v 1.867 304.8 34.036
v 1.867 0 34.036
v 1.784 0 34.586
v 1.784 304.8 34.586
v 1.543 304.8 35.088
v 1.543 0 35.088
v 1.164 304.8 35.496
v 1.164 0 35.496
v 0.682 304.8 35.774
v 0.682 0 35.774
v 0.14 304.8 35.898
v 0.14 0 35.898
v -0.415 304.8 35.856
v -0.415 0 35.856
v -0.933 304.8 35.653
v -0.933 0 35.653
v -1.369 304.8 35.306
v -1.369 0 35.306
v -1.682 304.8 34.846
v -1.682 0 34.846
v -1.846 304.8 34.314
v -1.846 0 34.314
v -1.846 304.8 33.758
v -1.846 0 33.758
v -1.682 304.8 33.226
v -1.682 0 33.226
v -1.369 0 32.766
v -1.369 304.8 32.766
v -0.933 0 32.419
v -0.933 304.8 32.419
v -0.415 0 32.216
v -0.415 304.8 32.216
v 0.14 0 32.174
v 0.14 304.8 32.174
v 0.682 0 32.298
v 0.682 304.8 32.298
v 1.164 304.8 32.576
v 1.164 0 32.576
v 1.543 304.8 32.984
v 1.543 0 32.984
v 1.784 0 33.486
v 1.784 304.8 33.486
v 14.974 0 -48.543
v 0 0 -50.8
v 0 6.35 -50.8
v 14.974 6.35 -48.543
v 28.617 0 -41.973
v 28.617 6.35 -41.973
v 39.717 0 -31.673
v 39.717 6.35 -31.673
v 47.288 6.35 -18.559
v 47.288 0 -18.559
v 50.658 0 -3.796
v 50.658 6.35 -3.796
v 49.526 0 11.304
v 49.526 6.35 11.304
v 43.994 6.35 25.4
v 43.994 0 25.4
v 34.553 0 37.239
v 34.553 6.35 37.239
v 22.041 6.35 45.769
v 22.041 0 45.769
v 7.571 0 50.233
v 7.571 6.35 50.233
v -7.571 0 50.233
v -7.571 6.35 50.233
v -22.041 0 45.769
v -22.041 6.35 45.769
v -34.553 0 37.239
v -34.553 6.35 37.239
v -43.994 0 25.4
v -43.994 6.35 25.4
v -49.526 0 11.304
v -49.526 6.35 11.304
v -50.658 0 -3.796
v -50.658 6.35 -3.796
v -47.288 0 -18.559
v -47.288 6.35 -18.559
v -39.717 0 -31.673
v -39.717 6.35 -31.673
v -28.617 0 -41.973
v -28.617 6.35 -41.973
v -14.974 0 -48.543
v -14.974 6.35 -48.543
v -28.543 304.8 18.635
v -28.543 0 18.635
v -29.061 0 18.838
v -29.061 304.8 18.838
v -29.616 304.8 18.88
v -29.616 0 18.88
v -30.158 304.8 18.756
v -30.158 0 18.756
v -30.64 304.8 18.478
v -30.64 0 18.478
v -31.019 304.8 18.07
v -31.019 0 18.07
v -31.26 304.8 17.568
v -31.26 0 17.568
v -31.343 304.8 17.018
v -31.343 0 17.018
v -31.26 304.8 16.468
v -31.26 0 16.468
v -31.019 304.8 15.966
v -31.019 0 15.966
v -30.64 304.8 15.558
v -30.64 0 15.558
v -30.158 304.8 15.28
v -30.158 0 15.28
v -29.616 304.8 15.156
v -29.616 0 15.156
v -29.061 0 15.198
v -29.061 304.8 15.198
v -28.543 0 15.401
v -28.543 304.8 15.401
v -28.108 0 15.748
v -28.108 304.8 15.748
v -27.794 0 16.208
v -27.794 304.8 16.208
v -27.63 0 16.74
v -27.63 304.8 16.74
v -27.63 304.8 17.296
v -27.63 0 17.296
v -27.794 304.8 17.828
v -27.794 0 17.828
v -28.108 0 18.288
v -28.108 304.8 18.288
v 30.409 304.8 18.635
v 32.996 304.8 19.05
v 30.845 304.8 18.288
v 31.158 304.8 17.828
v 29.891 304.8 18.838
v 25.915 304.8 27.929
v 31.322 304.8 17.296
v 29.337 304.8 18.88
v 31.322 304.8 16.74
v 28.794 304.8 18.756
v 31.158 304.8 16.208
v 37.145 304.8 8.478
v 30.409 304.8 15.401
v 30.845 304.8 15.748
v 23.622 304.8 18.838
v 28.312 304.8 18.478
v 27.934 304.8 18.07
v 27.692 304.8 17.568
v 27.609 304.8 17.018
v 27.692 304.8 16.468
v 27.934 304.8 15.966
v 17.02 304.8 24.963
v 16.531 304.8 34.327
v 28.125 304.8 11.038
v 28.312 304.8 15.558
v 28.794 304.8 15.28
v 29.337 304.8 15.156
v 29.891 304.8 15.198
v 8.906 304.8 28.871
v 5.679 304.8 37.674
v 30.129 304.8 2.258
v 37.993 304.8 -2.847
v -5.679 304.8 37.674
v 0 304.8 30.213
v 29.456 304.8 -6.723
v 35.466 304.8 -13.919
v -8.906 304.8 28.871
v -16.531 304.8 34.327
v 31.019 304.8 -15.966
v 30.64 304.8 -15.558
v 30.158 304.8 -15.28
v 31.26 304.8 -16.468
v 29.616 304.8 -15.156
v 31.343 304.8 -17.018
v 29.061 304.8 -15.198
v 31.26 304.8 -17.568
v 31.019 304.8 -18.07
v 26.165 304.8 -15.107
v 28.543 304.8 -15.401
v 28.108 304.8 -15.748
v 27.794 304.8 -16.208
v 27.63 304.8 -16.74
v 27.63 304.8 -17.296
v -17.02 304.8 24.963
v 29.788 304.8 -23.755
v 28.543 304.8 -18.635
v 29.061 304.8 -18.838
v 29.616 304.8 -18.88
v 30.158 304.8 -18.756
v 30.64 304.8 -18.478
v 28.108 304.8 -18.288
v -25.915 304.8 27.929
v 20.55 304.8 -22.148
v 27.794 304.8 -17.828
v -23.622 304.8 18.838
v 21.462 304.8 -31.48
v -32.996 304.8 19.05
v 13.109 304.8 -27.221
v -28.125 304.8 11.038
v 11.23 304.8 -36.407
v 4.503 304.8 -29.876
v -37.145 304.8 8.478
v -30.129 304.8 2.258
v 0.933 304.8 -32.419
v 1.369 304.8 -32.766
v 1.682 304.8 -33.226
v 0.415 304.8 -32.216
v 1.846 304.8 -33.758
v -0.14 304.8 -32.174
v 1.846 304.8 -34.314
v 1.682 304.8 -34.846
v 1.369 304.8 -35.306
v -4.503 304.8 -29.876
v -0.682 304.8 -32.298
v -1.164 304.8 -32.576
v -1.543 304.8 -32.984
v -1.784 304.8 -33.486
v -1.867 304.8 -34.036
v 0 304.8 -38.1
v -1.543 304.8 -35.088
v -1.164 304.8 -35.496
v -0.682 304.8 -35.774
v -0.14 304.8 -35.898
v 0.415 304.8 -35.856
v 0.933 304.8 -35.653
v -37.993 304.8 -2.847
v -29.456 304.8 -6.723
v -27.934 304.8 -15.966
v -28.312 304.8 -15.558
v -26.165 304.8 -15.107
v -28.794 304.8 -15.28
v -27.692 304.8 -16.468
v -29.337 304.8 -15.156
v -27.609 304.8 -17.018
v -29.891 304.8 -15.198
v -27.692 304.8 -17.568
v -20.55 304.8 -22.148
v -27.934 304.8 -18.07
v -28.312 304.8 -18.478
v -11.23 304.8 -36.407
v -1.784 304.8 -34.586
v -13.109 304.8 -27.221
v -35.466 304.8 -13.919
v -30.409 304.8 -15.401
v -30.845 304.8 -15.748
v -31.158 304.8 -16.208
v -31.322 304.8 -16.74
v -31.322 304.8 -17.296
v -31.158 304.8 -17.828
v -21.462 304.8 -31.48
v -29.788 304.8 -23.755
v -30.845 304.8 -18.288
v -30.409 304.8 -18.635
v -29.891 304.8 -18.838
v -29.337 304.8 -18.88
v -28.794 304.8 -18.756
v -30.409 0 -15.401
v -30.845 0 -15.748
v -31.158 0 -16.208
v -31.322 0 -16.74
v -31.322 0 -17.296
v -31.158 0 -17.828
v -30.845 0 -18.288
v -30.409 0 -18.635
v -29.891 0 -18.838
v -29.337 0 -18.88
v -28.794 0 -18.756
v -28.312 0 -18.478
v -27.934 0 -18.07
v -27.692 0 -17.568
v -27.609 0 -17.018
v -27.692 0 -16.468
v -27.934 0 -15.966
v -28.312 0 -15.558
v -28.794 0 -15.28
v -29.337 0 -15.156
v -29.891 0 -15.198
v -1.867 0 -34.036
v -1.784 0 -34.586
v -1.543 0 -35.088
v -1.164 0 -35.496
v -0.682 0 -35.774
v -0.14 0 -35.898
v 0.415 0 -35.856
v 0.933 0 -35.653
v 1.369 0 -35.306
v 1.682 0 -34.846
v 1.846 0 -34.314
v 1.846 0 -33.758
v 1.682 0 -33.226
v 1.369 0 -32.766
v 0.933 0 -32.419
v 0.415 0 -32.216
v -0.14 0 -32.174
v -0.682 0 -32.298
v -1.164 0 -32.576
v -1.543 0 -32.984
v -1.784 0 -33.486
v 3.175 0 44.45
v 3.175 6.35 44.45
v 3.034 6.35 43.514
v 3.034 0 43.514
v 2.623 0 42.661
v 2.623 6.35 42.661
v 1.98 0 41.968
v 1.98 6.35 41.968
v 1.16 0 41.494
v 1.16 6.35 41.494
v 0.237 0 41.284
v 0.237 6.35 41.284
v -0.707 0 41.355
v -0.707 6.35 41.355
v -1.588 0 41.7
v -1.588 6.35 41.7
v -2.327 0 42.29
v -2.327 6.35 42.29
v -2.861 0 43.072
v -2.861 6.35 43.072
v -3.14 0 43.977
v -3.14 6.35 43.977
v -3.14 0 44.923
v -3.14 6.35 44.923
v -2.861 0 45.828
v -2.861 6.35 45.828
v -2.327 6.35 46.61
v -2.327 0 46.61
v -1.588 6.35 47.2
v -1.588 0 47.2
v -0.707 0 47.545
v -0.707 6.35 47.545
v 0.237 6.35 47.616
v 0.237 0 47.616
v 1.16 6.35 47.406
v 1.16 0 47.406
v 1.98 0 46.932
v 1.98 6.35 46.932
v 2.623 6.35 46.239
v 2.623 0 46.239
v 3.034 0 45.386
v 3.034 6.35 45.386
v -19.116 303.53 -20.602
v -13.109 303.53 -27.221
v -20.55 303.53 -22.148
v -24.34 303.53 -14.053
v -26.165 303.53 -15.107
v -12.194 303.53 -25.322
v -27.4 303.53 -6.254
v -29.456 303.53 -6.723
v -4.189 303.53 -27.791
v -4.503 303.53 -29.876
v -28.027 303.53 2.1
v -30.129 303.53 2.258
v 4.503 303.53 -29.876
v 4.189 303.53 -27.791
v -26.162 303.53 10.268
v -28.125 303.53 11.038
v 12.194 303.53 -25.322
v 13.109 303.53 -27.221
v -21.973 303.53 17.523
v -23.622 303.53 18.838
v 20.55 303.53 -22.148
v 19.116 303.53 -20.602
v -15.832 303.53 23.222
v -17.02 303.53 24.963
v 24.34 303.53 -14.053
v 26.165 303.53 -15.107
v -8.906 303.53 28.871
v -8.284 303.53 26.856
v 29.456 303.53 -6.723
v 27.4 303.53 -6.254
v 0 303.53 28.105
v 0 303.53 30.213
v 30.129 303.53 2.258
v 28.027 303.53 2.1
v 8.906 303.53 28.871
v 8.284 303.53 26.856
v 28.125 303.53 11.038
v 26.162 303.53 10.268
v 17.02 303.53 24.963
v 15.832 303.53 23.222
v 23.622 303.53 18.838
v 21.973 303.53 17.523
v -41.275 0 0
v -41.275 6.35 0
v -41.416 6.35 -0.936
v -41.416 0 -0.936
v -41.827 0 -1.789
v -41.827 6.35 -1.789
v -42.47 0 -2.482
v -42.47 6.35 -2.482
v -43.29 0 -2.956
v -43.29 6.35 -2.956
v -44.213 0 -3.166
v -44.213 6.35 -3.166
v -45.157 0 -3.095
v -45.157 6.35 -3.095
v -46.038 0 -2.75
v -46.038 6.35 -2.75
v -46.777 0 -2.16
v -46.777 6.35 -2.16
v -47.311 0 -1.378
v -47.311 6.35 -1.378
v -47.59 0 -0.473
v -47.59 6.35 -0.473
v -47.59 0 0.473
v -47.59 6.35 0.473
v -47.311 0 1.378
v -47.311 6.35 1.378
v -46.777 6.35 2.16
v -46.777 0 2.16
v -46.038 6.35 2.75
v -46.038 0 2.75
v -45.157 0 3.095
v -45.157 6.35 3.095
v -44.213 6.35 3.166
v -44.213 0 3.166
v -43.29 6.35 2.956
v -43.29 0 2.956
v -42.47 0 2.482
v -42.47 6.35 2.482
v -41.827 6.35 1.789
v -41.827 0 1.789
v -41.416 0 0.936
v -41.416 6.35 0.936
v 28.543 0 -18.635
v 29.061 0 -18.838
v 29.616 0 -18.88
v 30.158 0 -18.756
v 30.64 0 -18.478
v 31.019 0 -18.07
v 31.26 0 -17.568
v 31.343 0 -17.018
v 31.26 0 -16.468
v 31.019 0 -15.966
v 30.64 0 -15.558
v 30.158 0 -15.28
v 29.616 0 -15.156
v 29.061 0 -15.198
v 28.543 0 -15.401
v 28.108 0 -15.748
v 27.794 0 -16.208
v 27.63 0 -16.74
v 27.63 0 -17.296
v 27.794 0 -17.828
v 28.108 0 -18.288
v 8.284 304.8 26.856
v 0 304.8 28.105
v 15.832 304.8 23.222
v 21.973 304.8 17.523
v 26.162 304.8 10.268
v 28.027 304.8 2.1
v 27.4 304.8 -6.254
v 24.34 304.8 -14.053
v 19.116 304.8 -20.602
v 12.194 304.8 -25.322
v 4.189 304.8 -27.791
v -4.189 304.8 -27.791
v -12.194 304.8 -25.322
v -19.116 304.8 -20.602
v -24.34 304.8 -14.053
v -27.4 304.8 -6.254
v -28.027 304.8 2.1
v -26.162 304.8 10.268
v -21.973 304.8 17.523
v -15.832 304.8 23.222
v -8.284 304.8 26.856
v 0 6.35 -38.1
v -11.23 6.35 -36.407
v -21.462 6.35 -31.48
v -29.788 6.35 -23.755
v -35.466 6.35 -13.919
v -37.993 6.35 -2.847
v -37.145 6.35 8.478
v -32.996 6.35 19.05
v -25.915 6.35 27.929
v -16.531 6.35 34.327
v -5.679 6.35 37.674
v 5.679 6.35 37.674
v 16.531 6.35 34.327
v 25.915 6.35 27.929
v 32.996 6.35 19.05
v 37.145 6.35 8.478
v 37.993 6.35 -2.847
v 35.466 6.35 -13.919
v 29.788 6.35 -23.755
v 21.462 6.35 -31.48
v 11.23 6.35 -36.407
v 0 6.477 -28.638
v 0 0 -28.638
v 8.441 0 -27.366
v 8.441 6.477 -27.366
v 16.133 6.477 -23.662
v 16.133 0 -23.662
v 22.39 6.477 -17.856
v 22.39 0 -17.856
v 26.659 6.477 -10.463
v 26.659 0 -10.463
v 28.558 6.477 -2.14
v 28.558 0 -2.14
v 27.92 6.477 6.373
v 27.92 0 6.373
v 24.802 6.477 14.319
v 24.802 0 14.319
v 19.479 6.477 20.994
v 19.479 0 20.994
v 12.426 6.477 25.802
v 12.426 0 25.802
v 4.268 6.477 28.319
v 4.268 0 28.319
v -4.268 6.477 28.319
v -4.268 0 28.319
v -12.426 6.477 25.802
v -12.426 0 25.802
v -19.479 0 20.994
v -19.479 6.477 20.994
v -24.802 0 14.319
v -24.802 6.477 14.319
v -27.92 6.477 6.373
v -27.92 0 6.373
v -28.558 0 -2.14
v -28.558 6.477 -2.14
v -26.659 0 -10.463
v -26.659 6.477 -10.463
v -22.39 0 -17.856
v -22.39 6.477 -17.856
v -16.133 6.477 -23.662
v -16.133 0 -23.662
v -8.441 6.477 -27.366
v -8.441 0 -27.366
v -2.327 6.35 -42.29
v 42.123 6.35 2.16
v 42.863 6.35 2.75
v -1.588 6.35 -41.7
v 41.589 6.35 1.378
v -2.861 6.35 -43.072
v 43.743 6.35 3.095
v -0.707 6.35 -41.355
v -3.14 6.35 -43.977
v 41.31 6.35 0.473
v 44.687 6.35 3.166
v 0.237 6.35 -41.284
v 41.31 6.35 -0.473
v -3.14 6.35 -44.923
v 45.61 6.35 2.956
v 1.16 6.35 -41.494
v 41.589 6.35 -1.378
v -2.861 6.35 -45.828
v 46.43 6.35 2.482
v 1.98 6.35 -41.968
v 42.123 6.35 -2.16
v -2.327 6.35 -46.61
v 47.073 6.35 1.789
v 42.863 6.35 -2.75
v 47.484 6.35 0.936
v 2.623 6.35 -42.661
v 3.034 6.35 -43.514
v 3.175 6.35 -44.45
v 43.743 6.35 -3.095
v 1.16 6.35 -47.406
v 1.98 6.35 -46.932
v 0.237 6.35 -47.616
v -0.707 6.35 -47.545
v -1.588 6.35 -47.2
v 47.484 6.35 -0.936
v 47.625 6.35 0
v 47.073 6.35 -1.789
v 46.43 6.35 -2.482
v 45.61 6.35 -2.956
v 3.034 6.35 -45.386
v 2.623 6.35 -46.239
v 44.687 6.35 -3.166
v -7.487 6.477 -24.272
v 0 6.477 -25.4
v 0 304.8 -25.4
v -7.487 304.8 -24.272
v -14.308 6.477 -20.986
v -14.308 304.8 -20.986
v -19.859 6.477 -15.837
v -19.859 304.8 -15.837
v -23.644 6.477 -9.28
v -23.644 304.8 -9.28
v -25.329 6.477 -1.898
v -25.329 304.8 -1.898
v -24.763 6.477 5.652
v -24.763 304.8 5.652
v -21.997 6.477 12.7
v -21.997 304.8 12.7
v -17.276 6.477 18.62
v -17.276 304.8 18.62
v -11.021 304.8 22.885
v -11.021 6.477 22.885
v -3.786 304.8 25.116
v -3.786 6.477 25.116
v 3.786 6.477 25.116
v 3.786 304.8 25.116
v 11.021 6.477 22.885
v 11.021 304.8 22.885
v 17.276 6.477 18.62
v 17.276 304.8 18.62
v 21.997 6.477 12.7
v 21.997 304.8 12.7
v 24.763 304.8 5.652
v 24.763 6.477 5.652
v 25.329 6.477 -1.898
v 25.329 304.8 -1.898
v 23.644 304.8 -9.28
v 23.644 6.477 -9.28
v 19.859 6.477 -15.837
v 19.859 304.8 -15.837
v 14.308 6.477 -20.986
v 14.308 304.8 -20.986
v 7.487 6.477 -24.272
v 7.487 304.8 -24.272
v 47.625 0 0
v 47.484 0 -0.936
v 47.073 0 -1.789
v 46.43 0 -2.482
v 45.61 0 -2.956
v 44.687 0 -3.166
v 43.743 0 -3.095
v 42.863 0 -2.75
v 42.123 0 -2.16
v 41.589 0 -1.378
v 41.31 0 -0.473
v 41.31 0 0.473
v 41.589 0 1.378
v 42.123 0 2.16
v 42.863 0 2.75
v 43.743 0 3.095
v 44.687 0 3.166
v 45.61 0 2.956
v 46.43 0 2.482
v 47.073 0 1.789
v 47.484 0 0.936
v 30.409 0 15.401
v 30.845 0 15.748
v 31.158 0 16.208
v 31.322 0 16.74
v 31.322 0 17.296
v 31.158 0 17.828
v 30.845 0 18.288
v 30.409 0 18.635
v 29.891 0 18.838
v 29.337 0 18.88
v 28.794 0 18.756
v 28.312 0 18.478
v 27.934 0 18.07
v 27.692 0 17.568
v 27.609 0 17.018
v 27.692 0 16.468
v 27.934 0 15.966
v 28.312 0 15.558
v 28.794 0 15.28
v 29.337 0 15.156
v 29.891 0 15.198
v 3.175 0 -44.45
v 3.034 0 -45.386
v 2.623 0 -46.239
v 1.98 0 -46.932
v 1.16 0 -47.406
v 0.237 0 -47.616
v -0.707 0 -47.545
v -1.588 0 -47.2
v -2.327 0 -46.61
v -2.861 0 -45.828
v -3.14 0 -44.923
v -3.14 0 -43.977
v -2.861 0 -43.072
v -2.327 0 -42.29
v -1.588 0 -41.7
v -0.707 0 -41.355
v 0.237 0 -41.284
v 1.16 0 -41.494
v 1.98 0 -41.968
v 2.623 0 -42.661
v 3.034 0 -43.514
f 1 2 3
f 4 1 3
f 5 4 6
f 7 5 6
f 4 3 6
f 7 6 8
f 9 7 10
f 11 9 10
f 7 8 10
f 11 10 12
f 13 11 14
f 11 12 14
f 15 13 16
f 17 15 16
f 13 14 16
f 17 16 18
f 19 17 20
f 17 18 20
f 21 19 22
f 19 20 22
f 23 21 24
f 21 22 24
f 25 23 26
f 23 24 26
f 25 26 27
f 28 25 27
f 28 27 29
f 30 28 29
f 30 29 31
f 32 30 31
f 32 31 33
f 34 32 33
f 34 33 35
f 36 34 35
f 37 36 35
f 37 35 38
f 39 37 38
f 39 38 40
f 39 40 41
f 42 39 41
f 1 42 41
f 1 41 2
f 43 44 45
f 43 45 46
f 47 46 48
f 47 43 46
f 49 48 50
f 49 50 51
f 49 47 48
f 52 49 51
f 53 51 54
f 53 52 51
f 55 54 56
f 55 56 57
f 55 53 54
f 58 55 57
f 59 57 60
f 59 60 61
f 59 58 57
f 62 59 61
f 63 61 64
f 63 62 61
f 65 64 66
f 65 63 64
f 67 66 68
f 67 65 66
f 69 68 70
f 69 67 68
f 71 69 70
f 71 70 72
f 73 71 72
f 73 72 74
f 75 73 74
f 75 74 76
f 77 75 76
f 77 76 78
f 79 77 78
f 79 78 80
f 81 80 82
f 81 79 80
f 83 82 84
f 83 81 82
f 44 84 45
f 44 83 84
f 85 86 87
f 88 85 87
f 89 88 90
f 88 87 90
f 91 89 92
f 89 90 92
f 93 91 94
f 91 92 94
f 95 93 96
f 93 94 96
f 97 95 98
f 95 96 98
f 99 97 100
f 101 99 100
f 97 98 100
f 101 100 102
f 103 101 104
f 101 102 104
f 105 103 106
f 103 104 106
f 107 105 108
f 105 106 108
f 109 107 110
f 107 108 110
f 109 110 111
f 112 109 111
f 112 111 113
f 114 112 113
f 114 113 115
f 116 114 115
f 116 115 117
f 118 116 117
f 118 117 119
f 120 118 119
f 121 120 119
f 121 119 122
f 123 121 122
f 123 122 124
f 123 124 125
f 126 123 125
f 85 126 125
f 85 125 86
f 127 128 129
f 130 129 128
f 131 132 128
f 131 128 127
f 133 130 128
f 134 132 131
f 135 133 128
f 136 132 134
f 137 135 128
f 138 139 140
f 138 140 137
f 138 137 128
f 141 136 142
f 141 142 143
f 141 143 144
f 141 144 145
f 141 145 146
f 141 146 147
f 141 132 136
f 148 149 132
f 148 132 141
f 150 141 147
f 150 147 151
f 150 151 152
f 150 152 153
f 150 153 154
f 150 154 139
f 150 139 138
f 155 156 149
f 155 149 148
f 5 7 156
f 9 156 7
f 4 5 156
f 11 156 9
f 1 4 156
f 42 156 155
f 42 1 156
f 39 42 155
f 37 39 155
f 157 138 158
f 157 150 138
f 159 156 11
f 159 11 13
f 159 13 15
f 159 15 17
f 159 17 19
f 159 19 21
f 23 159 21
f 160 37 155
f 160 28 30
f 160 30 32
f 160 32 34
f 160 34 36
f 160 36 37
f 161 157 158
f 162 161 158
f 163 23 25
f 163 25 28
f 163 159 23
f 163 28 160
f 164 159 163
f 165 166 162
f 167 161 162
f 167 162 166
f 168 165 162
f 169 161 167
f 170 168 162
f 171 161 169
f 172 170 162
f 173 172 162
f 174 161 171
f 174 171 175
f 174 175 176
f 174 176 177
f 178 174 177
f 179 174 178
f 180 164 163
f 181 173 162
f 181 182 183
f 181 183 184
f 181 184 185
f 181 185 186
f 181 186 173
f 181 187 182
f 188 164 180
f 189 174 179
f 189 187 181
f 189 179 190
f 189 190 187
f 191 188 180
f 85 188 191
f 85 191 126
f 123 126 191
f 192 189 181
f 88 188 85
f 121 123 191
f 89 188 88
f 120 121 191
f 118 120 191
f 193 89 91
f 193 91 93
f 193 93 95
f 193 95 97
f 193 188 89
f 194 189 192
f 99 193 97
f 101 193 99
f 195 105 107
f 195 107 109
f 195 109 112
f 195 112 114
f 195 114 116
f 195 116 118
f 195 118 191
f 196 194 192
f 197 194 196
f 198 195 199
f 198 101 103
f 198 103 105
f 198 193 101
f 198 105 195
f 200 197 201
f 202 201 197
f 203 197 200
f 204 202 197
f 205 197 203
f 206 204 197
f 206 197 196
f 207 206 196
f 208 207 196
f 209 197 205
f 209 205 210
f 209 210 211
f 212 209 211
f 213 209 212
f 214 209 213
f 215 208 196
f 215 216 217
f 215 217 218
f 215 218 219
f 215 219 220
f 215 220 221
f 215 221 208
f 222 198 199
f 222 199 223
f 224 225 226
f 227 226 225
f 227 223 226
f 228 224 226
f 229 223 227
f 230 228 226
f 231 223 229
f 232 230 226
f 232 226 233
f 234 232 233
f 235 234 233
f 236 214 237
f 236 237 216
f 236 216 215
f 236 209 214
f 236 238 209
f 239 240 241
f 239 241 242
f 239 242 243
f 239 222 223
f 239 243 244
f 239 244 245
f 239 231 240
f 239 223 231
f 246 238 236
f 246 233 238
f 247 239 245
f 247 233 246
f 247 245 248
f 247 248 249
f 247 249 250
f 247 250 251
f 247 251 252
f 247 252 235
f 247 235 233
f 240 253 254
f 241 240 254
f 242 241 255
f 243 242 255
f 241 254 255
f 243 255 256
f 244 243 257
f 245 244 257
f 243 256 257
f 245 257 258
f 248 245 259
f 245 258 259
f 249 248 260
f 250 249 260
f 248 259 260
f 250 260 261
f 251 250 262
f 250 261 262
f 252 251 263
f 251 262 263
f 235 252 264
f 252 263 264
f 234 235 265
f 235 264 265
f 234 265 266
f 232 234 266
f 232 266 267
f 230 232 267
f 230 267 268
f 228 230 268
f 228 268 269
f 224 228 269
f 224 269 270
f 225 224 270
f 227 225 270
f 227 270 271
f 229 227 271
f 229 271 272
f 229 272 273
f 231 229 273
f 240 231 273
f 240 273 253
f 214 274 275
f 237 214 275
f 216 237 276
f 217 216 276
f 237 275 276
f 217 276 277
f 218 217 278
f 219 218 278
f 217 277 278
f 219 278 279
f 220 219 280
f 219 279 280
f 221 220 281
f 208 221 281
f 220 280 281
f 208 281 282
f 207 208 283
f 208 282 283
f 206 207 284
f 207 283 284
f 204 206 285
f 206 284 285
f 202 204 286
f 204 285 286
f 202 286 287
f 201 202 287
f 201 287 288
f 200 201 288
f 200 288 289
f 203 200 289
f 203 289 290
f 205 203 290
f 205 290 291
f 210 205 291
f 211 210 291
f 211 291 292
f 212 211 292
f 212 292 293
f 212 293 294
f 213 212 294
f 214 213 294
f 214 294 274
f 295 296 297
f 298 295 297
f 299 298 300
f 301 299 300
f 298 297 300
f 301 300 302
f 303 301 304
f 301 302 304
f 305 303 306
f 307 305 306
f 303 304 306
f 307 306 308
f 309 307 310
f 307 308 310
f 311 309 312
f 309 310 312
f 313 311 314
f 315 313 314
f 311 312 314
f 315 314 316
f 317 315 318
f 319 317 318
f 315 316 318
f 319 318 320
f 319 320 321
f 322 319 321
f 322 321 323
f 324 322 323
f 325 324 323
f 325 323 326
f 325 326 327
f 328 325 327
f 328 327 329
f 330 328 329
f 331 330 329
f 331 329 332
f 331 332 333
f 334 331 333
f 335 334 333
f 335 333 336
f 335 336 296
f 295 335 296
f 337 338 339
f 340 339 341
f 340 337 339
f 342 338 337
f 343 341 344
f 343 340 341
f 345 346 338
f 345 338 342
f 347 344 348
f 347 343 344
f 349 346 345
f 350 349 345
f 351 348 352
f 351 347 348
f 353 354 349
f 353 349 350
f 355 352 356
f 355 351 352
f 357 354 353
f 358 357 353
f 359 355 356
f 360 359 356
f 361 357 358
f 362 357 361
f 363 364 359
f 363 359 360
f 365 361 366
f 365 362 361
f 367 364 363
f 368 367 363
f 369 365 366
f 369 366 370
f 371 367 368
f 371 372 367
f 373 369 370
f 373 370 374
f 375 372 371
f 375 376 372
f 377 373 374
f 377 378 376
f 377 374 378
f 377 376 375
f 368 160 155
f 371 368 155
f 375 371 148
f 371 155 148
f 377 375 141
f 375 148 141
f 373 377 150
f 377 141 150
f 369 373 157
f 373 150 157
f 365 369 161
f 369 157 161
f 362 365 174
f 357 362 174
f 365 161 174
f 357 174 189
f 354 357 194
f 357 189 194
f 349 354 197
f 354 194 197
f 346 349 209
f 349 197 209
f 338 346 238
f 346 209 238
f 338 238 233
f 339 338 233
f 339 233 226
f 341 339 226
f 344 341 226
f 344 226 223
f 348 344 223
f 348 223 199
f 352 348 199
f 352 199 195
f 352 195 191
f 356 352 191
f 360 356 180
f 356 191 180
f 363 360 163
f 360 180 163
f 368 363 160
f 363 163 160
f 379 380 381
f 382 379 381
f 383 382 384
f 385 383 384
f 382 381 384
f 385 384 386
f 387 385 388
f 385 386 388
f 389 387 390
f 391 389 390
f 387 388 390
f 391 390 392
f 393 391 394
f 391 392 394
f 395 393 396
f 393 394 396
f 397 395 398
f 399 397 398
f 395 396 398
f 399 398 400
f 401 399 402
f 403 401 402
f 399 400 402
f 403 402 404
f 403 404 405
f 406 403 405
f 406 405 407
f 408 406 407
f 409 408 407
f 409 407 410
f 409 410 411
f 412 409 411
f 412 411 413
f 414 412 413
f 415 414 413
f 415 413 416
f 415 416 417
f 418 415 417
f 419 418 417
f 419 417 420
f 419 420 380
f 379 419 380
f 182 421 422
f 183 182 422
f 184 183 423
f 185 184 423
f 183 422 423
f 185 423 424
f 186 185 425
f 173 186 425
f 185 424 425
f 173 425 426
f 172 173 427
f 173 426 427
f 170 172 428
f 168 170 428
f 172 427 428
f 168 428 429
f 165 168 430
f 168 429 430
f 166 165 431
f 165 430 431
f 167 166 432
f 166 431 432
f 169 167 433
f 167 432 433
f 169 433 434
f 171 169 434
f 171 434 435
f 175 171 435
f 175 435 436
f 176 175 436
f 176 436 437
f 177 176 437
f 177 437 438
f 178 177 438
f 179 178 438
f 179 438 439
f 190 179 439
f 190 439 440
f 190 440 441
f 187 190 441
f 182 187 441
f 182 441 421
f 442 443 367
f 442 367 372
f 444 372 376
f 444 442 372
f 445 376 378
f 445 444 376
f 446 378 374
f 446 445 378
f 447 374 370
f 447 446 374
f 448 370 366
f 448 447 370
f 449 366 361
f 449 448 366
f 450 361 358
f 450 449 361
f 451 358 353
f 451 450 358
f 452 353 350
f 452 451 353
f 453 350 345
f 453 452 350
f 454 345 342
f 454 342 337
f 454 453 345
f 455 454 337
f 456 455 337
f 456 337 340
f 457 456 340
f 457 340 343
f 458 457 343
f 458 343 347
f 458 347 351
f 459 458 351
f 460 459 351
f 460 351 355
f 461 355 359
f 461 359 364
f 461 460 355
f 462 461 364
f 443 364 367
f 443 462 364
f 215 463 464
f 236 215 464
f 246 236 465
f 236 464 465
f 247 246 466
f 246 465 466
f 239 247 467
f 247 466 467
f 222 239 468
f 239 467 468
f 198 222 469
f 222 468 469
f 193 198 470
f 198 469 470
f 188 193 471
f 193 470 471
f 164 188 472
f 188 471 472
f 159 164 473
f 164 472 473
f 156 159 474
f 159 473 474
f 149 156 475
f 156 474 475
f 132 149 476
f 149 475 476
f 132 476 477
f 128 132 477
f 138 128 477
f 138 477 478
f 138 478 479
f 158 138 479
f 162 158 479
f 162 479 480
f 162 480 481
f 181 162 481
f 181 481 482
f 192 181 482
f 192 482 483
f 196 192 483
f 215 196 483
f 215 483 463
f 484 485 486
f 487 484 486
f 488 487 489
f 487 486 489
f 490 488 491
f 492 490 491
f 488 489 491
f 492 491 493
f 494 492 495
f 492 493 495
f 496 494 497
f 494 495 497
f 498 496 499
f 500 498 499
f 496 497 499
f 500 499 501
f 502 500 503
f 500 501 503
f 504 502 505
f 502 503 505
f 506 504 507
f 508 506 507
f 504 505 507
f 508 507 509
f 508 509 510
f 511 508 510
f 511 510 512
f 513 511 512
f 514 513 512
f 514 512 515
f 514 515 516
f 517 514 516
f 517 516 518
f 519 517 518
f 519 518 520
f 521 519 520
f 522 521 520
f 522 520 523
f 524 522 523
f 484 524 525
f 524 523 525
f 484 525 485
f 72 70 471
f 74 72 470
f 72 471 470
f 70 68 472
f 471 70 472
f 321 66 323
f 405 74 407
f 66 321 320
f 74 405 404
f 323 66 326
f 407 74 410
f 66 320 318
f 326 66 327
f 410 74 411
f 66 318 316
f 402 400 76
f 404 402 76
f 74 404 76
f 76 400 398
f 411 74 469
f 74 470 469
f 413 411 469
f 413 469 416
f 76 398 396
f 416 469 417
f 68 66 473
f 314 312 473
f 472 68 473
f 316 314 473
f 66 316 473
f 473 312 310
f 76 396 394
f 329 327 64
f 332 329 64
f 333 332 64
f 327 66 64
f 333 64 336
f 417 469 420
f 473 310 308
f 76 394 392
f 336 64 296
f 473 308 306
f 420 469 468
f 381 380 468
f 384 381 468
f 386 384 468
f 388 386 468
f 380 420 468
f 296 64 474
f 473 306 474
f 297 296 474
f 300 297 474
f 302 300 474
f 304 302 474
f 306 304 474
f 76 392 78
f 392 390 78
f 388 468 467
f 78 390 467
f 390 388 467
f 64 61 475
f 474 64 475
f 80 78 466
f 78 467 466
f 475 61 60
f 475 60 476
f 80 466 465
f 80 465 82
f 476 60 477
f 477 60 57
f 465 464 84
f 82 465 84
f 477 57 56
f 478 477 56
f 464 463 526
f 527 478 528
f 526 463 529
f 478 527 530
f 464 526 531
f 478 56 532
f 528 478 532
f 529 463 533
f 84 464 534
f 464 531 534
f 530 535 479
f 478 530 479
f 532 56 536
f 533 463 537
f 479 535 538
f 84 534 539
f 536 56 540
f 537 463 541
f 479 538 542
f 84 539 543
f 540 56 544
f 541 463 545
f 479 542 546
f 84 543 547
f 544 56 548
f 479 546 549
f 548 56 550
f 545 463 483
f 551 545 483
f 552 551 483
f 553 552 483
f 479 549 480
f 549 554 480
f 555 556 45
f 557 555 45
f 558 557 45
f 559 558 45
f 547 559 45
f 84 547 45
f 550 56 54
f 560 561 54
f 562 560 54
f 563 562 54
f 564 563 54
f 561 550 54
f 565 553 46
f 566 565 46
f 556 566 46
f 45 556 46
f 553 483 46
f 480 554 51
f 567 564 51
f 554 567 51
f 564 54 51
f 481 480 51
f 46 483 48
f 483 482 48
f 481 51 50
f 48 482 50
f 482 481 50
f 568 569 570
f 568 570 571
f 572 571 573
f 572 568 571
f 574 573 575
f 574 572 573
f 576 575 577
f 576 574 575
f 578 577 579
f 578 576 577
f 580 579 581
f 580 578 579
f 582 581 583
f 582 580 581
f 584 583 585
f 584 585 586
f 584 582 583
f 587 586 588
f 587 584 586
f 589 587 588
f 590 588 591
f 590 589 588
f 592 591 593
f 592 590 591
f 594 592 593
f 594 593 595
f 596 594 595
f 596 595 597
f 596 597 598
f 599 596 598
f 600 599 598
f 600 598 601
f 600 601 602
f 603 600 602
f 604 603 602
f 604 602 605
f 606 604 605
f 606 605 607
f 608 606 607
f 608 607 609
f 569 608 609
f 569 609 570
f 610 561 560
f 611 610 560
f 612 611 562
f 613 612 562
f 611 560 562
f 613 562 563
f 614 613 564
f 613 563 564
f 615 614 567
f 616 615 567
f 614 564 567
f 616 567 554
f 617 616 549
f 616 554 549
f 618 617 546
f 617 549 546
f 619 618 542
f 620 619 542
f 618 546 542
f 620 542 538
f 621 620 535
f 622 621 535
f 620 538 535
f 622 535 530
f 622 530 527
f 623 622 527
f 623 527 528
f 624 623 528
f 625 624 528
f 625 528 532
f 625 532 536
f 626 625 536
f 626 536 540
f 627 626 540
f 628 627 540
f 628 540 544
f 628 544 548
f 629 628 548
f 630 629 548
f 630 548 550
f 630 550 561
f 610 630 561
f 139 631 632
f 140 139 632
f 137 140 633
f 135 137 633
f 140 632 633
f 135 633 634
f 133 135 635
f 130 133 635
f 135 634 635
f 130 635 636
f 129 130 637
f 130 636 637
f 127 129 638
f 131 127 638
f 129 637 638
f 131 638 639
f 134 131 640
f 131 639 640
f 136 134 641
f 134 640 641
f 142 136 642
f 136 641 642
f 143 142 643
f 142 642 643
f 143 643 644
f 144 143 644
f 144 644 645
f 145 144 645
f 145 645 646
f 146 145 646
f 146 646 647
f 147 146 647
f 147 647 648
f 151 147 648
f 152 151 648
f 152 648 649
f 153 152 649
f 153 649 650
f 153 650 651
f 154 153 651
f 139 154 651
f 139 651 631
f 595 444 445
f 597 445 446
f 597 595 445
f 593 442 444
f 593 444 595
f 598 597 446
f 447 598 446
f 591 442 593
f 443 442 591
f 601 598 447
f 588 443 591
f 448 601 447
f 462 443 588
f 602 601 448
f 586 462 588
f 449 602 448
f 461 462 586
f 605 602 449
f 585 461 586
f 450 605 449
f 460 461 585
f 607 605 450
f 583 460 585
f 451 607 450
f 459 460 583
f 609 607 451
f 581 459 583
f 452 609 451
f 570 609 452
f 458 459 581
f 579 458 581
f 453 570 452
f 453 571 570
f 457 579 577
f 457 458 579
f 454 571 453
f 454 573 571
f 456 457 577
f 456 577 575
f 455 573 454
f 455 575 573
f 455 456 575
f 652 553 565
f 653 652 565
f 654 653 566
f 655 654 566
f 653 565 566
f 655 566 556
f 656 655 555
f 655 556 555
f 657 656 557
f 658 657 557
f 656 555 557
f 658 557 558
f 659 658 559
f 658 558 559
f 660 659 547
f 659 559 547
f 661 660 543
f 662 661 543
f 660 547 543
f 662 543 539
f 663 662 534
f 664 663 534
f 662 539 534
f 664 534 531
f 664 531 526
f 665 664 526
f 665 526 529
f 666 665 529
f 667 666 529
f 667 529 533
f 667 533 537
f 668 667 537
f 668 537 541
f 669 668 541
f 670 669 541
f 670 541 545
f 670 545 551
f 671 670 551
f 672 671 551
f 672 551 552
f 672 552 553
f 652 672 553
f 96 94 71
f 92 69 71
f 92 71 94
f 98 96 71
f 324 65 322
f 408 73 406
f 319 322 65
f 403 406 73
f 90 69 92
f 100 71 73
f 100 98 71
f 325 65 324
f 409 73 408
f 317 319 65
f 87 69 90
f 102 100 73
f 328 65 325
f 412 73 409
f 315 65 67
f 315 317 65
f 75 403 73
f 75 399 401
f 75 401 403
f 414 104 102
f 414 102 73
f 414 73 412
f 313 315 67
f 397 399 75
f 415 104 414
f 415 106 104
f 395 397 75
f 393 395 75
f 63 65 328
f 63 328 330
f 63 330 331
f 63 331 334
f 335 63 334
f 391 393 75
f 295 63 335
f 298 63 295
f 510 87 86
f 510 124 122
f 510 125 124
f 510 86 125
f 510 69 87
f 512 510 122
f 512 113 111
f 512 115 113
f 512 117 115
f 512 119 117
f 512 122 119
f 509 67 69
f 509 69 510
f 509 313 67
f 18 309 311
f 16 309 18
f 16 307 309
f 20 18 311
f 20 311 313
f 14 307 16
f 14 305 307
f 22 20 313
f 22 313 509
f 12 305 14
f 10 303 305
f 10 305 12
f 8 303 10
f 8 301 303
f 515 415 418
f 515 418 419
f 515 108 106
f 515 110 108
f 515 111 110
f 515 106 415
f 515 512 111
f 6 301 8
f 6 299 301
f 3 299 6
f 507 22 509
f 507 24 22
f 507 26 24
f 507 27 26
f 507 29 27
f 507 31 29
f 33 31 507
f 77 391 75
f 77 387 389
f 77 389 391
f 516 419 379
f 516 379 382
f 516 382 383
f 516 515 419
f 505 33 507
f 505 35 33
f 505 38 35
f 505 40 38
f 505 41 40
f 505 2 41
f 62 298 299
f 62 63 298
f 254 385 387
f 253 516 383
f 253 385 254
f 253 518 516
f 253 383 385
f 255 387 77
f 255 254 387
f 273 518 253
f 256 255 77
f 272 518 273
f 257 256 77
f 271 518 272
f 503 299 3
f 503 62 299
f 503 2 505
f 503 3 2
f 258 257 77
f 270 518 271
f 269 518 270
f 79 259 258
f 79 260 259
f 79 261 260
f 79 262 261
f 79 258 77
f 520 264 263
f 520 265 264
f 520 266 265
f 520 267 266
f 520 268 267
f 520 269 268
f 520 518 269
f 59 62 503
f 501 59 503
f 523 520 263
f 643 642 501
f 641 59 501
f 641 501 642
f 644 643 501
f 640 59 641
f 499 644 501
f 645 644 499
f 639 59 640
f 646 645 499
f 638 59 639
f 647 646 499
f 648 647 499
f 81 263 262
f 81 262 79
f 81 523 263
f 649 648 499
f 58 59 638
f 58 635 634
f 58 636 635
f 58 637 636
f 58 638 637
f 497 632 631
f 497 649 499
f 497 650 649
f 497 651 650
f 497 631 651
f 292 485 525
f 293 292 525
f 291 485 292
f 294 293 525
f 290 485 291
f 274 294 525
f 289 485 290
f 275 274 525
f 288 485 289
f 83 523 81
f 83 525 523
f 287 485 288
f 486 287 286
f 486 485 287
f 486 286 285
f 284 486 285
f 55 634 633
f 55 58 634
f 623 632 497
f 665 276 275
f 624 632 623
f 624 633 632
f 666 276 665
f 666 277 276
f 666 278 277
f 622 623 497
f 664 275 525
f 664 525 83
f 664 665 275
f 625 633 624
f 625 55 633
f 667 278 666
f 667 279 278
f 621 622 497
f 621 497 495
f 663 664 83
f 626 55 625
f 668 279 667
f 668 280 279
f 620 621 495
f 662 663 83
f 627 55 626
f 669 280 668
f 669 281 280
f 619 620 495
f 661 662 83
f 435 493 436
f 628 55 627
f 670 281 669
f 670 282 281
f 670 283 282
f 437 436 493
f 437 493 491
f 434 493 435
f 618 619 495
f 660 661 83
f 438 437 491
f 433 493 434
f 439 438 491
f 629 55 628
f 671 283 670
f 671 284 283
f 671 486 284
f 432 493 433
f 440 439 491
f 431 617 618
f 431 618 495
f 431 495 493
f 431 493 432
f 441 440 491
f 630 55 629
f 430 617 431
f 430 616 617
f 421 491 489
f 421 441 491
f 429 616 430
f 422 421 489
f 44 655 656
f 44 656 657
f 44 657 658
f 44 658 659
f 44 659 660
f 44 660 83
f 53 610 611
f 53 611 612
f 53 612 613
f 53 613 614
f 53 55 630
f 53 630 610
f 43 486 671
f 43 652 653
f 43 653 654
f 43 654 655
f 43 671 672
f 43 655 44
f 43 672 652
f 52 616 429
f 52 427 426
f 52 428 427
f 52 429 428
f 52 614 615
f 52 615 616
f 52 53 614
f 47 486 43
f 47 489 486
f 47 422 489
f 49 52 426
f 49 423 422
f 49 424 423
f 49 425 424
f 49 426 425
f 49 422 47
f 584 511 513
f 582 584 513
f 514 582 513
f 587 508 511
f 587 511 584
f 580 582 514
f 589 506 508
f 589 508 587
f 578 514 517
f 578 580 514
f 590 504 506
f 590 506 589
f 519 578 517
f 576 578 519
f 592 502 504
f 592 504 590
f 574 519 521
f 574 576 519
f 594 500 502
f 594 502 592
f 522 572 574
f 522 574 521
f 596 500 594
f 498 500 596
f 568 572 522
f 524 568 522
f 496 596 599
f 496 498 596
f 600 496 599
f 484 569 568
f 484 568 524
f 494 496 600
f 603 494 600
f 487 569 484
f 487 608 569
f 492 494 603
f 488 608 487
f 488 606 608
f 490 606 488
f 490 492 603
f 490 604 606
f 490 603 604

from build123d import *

# Parameters (mm, degrees)
SKETCH1_R                        = 38.1
SKETCH1_R_2                      = 25.4
BOSS_EXTRUDE1_DEPTH              = 304.8
SKETCH2_R                        = 50.8
SKETCH2_R_2                      = 38.1
BOSS_EXTRUDE2_DEPTH              = 6.35
F_1_4_0_25_DIAMETER_HOLE1_D      = 6.35
SKETCH5_R                        = 28.6385
CUT_EXTRUDE1_DEPTH               = 6.477
SKETCH6_R                        = 30.2133
SKETCH6_R_2                      = 28.1051
CUT_EXTRUDE2_DEPTH               = 1.27
TAPPED_HOLE_FOR_6_32_HELICOIL1_D = 3.7338
CIRPATTERN1_COUNT                = 6


with BuildPart() as part:
    # Sketch1 → Boss-Extrude1 (new body)
    with BuildSketch(Plane(origin=(0, 0, 0), x_dir=(1, 0, 0), z_dir=(0, 1, 0))):
        with Locations(Location((0, 0, 0), (0, 0, 90))):
            Circle(SKETCH1_R)
        with Locations(Location((0, 0, 0), (0, 0, 90))):
            Circle(SKETCH1_R_2, mode=Mode.SUBTRACT)
    extrude(amount=BOSS_EXTRUDE1_DEPTH)

    # Sketch2 → Boss-Extrude2 (add)
    with BuildSketch(Plane(origin=(0, 0, 0), x_dir=(-1, 0, 0), z_dir=(0, -1, 0))):
        with Locations(Location((0, 0, 0), (0, 0, 90))):
            Circle(SKETCH2_R)
        with Locations(Location((0, 0, 0), (0, 0, 90))):
            Circle(SKETCH2_R_2, mode=Mode.SUBTRACT)
    extrude(amount=-BOSS_EXTRUDE2_DEPTH)

    # 1/4 (0.25) Diameter Hole1 (through all)
    with Locations(Plane(origin=(0, 0, 0), x_dir=(-1, 0, 0), z_dir=(0, -1, 0))):
        with Locations((0, -44.45), (-44.45, 0), (0, 44.45), (44.45, 0)):
            Hole(F_1_4_0_25_DIAMETER_HOLE1_D / 2)

    # Sketch5 → Cut-Extrude1 (cut)
    with BuildSketch(Plane(origin=(0, 0, 0), x_dir=(-1, 0, 0), z_dir=(0, -1, 0))):
        with Locations(Location((0, 0, 0), (0, 0, 90))):
            Circle(SKETCH5_R)
    extrude(amount=-CUT_EXTRUDE1_DEPTH, mode=Mode.SUBTRACT)

    # Sketch6 → Cut-Extrude2 (cut)
    with BuildSketch(Plane(origin=(0, 304.8, 0), x_dir=(1, 0, 0), z_dir=(0, 1, 0))):
        with Locations(Location((0, 0, 0), (0, 0, 270))):
            Circle(SKETCH6_R)
        with Locations(Location((0, 0, 0), (0, 0, 270))):
            Circle(SKETCH6_R_2, mode=Mode.SUBTRACT)
    extrude(amount=-CUT_EXTRUDE2_DEPTH, mode=Mode.SUBTRACT)

    # Tapped Hole for #6-32 Helicoil1 (through all)
    with Locations(Plane(origin=(0, 304.8, 0), x_dir=(1, 0, 0), z_dir=(0, 1, 0))):
        with Locations((0, 34.036)):
            tapped_hole_for_6_32_helicoil1 = Hole(TAPPED_HOLE_FOR_6_32_HELICOIL1_D / 2)

    # CirPattern1: Tapped Hole for #6-32 Helicoil1 ×6 about axis
    cirpattern1_axis = Axis((0, 0, 0), (0, 1, 0))
    for i in range(1, CIRPATTERN1_COUNT):
        add(tapped_hole_for_6_32_helicoil1.rotate(cirpattern1_axis, i * 360 / CIRPATTERN1_COUNT), mode=Mode.SUBTRACT)


solid = part.part
